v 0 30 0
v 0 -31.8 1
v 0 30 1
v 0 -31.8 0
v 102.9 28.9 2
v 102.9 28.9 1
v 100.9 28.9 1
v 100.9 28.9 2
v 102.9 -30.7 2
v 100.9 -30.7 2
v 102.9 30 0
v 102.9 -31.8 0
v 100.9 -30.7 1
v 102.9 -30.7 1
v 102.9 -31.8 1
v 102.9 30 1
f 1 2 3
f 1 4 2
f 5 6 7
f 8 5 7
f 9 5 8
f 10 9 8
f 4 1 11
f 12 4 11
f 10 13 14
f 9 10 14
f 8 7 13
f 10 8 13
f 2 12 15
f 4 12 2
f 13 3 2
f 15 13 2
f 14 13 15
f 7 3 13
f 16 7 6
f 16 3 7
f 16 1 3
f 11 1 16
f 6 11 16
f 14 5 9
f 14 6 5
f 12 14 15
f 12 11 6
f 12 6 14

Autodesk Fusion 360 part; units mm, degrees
sketch "Sketch1" plane through (0, 0, 0) normal (0, 0, 1) x (1, 0, 0)
  line L0 (0, 30) -> (102.9, 30)
  line L1 (102.9, 30) -> (102.9, -31.8)
  line L2 (102.9, -31.8) -> (0, -31.8)
  line L3 (0, -31.8) -> (0, 30)
  dimension "d1" = 102.9
  dimension "d2" = 61.8
extrude "Extrude1" add sketch "Sketch1" along normal blind 1
sketch "Sketch2" plane through (0, 0, 1) normal (0, 0, 1) x (-1, 0, 0)
  line L0 (0, 31.8) -> (-102.9, 31.8)
  line L1 (-102.9, 31.8) -> (-102.9, -30)
  line L2 (-102.9, -30) -> (0, -30)
  line L3 (0, -30) -> (0, 31.8)
  line L4 (0, 0.9) -> (-102.9, 0.9) construction
  line L5 (-102.9, -28.9) -> (-100.9, -28.9)
  line L6 (-100.9, -28.9) -> (-100.9, 30.7)
  line L7 (-100.9, 30.7) -> (-102.9, 30.7)
  line L8 (-102.9, 30.7) -> (-102.9, -28.9)
  dimension "d6" = 2
  dimension "d9" = 1.1
  dimension "d9" = 1.1
extrude "Extrude2" add sketch "Sketch2" along normal blind 1 contours L1 L5 L6 L7 L8
